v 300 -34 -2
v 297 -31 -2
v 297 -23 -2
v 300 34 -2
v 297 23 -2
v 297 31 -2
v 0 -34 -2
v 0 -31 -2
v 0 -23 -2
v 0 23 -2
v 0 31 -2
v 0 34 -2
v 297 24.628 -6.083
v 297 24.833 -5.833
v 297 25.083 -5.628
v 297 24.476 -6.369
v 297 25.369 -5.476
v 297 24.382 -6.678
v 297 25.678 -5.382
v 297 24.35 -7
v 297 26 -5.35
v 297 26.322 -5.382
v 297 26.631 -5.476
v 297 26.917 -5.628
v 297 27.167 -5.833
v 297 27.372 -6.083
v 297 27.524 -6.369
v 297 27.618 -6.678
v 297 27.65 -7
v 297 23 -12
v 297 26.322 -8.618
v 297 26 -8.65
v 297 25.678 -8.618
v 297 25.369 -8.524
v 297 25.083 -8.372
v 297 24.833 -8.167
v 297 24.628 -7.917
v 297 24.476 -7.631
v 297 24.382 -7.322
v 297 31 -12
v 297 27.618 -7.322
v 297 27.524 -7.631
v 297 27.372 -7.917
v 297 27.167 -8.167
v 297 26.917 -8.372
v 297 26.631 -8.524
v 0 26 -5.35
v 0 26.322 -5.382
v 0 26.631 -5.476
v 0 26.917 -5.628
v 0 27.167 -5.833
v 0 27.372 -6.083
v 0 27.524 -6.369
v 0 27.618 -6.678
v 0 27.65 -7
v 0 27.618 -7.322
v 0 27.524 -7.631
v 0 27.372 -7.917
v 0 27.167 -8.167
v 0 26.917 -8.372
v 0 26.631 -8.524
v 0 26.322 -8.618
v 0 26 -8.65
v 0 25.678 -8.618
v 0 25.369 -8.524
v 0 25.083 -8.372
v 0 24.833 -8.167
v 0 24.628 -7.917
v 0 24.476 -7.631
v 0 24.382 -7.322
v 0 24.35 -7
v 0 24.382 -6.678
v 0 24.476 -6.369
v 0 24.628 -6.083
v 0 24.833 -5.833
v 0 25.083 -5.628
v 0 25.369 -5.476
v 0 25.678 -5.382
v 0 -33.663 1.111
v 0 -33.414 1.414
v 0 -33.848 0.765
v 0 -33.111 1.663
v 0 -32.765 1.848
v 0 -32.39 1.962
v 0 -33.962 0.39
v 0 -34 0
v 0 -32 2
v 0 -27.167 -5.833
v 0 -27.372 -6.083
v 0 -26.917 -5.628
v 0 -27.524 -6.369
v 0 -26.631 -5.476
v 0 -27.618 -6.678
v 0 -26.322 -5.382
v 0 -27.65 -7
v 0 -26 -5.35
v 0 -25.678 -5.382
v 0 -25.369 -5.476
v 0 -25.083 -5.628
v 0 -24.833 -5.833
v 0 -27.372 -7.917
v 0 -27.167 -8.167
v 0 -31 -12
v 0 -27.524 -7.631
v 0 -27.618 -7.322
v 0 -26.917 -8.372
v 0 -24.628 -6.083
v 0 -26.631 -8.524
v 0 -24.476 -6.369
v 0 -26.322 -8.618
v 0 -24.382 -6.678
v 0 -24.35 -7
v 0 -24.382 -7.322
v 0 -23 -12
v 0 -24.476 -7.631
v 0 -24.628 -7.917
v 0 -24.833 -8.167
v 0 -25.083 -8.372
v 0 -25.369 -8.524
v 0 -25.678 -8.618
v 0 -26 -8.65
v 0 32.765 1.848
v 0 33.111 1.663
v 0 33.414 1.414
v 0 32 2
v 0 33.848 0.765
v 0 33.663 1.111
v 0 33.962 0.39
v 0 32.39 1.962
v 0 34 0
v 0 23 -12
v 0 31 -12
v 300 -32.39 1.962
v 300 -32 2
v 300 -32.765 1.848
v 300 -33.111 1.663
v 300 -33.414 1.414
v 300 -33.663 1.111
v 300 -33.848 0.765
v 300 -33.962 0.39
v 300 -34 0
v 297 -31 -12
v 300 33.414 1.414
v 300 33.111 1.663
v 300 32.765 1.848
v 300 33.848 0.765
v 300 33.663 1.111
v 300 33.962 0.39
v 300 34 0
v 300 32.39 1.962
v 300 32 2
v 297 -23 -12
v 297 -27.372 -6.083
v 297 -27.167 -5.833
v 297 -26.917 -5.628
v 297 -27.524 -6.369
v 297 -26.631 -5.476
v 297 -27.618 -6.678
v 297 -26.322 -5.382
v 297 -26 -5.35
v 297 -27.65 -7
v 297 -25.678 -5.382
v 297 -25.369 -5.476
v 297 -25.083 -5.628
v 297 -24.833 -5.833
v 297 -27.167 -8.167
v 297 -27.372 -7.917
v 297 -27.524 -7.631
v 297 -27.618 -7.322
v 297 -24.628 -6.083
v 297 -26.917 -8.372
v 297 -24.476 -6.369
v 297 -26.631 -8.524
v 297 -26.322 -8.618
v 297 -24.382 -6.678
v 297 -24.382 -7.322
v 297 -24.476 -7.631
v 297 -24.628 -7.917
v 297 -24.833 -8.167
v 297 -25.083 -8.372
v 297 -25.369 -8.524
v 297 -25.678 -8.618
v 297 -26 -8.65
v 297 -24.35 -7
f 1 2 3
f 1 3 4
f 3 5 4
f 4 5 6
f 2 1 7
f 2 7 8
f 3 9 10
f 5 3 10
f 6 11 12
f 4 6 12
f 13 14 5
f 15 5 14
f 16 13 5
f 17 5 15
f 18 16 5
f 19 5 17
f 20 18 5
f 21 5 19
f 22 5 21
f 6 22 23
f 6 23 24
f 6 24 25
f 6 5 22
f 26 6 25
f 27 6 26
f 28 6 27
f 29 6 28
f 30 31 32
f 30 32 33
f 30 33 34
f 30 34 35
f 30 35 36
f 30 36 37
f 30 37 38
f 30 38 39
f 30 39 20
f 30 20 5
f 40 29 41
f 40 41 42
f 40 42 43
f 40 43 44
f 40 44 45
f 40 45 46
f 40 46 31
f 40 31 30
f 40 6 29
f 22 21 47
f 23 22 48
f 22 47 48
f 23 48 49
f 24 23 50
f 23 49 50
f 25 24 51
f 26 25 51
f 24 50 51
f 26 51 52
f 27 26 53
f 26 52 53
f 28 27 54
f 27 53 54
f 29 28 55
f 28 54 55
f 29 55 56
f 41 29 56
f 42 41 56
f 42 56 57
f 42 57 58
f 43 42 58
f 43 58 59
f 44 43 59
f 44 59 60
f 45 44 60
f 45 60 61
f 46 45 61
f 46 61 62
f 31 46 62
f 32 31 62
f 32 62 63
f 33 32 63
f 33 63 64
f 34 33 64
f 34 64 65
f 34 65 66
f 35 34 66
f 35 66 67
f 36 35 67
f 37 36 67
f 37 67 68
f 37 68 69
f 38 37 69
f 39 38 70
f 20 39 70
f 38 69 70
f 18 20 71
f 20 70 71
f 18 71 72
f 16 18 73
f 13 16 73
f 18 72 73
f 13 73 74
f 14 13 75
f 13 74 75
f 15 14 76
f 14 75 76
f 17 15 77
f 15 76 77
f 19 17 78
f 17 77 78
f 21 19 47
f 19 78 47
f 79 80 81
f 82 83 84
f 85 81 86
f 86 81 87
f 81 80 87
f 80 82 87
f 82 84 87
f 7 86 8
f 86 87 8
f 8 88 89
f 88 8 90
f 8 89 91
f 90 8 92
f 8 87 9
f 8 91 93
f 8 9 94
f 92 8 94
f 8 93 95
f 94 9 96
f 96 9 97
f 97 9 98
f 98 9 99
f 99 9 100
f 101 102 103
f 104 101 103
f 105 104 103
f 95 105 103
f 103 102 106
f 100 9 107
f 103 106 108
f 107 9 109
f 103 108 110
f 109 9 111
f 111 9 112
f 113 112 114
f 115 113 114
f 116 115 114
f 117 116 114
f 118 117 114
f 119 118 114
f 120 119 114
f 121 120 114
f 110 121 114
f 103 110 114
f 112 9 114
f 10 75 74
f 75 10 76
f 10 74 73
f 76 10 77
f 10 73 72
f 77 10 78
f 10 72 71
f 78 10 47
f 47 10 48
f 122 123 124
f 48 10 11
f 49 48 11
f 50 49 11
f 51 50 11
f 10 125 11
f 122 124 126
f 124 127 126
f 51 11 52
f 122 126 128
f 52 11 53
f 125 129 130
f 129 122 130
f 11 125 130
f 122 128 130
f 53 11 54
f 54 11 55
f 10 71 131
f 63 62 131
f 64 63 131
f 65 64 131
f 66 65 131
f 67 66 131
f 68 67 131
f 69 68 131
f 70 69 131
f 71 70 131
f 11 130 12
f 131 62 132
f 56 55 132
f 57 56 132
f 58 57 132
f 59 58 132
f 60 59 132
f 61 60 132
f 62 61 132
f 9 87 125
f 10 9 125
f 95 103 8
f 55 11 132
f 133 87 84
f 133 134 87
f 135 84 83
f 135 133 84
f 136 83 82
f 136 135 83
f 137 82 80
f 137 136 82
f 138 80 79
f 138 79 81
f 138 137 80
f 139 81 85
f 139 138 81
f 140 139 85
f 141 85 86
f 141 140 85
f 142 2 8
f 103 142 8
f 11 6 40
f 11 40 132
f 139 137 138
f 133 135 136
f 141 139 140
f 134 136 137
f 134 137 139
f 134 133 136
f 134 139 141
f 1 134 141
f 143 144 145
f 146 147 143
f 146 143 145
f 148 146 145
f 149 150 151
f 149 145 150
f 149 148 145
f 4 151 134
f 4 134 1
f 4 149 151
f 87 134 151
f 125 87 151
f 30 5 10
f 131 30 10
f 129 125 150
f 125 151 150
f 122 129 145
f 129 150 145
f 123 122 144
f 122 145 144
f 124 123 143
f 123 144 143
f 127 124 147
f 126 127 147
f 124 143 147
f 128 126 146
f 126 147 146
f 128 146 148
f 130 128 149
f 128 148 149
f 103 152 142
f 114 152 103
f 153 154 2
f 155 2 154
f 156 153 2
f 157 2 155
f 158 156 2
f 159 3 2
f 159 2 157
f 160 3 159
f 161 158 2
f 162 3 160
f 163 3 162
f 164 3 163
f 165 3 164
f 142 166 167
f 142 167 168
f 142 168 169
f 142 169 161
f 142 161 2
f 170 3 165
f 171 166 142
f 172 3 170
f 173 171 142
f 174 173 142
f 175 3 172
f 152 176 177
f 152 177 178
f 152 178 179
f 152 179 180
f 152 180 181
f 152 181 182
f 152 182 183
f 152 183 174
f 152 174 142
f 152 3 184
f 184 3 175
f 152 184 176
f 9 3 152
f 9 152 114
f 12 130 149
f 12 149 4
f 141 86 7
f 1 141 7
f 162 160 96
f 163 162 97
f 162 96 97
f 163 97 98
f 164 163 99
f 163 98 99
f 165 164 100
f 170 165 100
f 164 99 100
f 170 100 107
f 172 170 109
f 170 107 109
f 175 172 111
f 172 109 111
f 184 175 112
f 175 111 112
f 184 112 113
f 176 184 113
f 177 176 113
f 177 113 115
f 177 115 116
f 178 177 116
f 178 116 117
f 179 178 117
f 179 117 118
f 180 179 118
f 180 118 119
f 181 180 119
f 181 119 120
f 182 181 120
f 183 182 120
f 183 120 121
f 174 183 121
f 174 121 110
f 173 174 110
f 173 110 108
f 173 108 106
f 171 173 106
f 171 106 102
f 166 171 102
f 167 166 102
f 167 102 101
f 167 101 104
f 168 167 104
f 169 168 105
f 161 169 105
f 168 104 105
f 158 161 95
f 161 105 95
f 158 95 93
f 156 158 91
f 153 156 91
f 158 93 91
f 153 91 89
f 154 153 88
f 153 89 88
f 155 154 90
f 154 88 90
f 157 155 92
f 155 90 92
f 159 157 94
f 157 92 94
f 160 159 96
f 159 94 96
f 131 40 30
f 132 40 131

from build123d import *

# Parameters (mm, degrees)
SKETCH_1_W          = 4
SKETCH_1_H          = 68
EXTRUDE_1_DEPTH     = 300
FILLET_1_R          = 2
SKETCH_2_W          = 300
SKETCH_2_H          = 8
EXTRUDE_2_DEPTH     = 10
HOLE_WIZARD_M4_1_D  = 3.3
SKETCH_5_W          = 3
SKETCH_5_H          = 10
CUT_EXTRUDE_1_DEPTH = 62


with BuildPart() as part:
    # 草圖1 → 填料-伸長1 (new body)
    with BuildSketch(Plane(origin=(0, 0, 0), x_dir=(0, 0, -1), z_dir=(1, 0, 0))):
        Rectangle(SKETCH_1_W, SKETCH_1_H)
    extrude(amount=EXTRUDE_1_DEPTH)

    # 圓角1
    fillet_1_edges = [part.edges().sort_by_distance(p)[0] for p in [
        (150, -34, 2),
        (150, 34, 2),
    ]]
    fillet(fillet_1_edges, radius=FILLET_1_R)

    # 草圖2 → 填料-伸長2 (add)
    with BuildSketch(Plane(origin=(0, 0, -2), x_dir=(-1, 0, 0), z_dir=(0, 0, -1))):
        with Locations((-150, 27)):
            Rectangle(SKETCH_2_W, SKETCH_2_H)
        with Locations((-150, -27)):
            Rectangle(SKETCH_2_W, SKETCH_2_H)
    extrude(amount=EXTRUDE_2_DEPTH)

    # M4  螺絲攻的螺孔鑽1 (through all)
    with Locations(Plane(origin=(300, 0, 0), x_dir=(0, 0, -1), z_dir=(1, 0, 0))):
        with Locations((7, 26), (7, -26)):
            Hole(HOLE_WIZARD_M4_1_D / 2)

    # 草圖5 → 除料-伸長1 (cut)
    with BuildSketch(Plane(origin=(0, 31, 0), x_dir=(1, 0, 0), z_dir=(0, 1, 0))):
        with Locations((298.5, 7)):
            Rectangle(SKETCH_5_W, SKETCH_5_H)
    extrude(amount=-CUT_EXTRUDE_1_DEPTH, mode=Mode.SUBTRACT)


solid = part.part
